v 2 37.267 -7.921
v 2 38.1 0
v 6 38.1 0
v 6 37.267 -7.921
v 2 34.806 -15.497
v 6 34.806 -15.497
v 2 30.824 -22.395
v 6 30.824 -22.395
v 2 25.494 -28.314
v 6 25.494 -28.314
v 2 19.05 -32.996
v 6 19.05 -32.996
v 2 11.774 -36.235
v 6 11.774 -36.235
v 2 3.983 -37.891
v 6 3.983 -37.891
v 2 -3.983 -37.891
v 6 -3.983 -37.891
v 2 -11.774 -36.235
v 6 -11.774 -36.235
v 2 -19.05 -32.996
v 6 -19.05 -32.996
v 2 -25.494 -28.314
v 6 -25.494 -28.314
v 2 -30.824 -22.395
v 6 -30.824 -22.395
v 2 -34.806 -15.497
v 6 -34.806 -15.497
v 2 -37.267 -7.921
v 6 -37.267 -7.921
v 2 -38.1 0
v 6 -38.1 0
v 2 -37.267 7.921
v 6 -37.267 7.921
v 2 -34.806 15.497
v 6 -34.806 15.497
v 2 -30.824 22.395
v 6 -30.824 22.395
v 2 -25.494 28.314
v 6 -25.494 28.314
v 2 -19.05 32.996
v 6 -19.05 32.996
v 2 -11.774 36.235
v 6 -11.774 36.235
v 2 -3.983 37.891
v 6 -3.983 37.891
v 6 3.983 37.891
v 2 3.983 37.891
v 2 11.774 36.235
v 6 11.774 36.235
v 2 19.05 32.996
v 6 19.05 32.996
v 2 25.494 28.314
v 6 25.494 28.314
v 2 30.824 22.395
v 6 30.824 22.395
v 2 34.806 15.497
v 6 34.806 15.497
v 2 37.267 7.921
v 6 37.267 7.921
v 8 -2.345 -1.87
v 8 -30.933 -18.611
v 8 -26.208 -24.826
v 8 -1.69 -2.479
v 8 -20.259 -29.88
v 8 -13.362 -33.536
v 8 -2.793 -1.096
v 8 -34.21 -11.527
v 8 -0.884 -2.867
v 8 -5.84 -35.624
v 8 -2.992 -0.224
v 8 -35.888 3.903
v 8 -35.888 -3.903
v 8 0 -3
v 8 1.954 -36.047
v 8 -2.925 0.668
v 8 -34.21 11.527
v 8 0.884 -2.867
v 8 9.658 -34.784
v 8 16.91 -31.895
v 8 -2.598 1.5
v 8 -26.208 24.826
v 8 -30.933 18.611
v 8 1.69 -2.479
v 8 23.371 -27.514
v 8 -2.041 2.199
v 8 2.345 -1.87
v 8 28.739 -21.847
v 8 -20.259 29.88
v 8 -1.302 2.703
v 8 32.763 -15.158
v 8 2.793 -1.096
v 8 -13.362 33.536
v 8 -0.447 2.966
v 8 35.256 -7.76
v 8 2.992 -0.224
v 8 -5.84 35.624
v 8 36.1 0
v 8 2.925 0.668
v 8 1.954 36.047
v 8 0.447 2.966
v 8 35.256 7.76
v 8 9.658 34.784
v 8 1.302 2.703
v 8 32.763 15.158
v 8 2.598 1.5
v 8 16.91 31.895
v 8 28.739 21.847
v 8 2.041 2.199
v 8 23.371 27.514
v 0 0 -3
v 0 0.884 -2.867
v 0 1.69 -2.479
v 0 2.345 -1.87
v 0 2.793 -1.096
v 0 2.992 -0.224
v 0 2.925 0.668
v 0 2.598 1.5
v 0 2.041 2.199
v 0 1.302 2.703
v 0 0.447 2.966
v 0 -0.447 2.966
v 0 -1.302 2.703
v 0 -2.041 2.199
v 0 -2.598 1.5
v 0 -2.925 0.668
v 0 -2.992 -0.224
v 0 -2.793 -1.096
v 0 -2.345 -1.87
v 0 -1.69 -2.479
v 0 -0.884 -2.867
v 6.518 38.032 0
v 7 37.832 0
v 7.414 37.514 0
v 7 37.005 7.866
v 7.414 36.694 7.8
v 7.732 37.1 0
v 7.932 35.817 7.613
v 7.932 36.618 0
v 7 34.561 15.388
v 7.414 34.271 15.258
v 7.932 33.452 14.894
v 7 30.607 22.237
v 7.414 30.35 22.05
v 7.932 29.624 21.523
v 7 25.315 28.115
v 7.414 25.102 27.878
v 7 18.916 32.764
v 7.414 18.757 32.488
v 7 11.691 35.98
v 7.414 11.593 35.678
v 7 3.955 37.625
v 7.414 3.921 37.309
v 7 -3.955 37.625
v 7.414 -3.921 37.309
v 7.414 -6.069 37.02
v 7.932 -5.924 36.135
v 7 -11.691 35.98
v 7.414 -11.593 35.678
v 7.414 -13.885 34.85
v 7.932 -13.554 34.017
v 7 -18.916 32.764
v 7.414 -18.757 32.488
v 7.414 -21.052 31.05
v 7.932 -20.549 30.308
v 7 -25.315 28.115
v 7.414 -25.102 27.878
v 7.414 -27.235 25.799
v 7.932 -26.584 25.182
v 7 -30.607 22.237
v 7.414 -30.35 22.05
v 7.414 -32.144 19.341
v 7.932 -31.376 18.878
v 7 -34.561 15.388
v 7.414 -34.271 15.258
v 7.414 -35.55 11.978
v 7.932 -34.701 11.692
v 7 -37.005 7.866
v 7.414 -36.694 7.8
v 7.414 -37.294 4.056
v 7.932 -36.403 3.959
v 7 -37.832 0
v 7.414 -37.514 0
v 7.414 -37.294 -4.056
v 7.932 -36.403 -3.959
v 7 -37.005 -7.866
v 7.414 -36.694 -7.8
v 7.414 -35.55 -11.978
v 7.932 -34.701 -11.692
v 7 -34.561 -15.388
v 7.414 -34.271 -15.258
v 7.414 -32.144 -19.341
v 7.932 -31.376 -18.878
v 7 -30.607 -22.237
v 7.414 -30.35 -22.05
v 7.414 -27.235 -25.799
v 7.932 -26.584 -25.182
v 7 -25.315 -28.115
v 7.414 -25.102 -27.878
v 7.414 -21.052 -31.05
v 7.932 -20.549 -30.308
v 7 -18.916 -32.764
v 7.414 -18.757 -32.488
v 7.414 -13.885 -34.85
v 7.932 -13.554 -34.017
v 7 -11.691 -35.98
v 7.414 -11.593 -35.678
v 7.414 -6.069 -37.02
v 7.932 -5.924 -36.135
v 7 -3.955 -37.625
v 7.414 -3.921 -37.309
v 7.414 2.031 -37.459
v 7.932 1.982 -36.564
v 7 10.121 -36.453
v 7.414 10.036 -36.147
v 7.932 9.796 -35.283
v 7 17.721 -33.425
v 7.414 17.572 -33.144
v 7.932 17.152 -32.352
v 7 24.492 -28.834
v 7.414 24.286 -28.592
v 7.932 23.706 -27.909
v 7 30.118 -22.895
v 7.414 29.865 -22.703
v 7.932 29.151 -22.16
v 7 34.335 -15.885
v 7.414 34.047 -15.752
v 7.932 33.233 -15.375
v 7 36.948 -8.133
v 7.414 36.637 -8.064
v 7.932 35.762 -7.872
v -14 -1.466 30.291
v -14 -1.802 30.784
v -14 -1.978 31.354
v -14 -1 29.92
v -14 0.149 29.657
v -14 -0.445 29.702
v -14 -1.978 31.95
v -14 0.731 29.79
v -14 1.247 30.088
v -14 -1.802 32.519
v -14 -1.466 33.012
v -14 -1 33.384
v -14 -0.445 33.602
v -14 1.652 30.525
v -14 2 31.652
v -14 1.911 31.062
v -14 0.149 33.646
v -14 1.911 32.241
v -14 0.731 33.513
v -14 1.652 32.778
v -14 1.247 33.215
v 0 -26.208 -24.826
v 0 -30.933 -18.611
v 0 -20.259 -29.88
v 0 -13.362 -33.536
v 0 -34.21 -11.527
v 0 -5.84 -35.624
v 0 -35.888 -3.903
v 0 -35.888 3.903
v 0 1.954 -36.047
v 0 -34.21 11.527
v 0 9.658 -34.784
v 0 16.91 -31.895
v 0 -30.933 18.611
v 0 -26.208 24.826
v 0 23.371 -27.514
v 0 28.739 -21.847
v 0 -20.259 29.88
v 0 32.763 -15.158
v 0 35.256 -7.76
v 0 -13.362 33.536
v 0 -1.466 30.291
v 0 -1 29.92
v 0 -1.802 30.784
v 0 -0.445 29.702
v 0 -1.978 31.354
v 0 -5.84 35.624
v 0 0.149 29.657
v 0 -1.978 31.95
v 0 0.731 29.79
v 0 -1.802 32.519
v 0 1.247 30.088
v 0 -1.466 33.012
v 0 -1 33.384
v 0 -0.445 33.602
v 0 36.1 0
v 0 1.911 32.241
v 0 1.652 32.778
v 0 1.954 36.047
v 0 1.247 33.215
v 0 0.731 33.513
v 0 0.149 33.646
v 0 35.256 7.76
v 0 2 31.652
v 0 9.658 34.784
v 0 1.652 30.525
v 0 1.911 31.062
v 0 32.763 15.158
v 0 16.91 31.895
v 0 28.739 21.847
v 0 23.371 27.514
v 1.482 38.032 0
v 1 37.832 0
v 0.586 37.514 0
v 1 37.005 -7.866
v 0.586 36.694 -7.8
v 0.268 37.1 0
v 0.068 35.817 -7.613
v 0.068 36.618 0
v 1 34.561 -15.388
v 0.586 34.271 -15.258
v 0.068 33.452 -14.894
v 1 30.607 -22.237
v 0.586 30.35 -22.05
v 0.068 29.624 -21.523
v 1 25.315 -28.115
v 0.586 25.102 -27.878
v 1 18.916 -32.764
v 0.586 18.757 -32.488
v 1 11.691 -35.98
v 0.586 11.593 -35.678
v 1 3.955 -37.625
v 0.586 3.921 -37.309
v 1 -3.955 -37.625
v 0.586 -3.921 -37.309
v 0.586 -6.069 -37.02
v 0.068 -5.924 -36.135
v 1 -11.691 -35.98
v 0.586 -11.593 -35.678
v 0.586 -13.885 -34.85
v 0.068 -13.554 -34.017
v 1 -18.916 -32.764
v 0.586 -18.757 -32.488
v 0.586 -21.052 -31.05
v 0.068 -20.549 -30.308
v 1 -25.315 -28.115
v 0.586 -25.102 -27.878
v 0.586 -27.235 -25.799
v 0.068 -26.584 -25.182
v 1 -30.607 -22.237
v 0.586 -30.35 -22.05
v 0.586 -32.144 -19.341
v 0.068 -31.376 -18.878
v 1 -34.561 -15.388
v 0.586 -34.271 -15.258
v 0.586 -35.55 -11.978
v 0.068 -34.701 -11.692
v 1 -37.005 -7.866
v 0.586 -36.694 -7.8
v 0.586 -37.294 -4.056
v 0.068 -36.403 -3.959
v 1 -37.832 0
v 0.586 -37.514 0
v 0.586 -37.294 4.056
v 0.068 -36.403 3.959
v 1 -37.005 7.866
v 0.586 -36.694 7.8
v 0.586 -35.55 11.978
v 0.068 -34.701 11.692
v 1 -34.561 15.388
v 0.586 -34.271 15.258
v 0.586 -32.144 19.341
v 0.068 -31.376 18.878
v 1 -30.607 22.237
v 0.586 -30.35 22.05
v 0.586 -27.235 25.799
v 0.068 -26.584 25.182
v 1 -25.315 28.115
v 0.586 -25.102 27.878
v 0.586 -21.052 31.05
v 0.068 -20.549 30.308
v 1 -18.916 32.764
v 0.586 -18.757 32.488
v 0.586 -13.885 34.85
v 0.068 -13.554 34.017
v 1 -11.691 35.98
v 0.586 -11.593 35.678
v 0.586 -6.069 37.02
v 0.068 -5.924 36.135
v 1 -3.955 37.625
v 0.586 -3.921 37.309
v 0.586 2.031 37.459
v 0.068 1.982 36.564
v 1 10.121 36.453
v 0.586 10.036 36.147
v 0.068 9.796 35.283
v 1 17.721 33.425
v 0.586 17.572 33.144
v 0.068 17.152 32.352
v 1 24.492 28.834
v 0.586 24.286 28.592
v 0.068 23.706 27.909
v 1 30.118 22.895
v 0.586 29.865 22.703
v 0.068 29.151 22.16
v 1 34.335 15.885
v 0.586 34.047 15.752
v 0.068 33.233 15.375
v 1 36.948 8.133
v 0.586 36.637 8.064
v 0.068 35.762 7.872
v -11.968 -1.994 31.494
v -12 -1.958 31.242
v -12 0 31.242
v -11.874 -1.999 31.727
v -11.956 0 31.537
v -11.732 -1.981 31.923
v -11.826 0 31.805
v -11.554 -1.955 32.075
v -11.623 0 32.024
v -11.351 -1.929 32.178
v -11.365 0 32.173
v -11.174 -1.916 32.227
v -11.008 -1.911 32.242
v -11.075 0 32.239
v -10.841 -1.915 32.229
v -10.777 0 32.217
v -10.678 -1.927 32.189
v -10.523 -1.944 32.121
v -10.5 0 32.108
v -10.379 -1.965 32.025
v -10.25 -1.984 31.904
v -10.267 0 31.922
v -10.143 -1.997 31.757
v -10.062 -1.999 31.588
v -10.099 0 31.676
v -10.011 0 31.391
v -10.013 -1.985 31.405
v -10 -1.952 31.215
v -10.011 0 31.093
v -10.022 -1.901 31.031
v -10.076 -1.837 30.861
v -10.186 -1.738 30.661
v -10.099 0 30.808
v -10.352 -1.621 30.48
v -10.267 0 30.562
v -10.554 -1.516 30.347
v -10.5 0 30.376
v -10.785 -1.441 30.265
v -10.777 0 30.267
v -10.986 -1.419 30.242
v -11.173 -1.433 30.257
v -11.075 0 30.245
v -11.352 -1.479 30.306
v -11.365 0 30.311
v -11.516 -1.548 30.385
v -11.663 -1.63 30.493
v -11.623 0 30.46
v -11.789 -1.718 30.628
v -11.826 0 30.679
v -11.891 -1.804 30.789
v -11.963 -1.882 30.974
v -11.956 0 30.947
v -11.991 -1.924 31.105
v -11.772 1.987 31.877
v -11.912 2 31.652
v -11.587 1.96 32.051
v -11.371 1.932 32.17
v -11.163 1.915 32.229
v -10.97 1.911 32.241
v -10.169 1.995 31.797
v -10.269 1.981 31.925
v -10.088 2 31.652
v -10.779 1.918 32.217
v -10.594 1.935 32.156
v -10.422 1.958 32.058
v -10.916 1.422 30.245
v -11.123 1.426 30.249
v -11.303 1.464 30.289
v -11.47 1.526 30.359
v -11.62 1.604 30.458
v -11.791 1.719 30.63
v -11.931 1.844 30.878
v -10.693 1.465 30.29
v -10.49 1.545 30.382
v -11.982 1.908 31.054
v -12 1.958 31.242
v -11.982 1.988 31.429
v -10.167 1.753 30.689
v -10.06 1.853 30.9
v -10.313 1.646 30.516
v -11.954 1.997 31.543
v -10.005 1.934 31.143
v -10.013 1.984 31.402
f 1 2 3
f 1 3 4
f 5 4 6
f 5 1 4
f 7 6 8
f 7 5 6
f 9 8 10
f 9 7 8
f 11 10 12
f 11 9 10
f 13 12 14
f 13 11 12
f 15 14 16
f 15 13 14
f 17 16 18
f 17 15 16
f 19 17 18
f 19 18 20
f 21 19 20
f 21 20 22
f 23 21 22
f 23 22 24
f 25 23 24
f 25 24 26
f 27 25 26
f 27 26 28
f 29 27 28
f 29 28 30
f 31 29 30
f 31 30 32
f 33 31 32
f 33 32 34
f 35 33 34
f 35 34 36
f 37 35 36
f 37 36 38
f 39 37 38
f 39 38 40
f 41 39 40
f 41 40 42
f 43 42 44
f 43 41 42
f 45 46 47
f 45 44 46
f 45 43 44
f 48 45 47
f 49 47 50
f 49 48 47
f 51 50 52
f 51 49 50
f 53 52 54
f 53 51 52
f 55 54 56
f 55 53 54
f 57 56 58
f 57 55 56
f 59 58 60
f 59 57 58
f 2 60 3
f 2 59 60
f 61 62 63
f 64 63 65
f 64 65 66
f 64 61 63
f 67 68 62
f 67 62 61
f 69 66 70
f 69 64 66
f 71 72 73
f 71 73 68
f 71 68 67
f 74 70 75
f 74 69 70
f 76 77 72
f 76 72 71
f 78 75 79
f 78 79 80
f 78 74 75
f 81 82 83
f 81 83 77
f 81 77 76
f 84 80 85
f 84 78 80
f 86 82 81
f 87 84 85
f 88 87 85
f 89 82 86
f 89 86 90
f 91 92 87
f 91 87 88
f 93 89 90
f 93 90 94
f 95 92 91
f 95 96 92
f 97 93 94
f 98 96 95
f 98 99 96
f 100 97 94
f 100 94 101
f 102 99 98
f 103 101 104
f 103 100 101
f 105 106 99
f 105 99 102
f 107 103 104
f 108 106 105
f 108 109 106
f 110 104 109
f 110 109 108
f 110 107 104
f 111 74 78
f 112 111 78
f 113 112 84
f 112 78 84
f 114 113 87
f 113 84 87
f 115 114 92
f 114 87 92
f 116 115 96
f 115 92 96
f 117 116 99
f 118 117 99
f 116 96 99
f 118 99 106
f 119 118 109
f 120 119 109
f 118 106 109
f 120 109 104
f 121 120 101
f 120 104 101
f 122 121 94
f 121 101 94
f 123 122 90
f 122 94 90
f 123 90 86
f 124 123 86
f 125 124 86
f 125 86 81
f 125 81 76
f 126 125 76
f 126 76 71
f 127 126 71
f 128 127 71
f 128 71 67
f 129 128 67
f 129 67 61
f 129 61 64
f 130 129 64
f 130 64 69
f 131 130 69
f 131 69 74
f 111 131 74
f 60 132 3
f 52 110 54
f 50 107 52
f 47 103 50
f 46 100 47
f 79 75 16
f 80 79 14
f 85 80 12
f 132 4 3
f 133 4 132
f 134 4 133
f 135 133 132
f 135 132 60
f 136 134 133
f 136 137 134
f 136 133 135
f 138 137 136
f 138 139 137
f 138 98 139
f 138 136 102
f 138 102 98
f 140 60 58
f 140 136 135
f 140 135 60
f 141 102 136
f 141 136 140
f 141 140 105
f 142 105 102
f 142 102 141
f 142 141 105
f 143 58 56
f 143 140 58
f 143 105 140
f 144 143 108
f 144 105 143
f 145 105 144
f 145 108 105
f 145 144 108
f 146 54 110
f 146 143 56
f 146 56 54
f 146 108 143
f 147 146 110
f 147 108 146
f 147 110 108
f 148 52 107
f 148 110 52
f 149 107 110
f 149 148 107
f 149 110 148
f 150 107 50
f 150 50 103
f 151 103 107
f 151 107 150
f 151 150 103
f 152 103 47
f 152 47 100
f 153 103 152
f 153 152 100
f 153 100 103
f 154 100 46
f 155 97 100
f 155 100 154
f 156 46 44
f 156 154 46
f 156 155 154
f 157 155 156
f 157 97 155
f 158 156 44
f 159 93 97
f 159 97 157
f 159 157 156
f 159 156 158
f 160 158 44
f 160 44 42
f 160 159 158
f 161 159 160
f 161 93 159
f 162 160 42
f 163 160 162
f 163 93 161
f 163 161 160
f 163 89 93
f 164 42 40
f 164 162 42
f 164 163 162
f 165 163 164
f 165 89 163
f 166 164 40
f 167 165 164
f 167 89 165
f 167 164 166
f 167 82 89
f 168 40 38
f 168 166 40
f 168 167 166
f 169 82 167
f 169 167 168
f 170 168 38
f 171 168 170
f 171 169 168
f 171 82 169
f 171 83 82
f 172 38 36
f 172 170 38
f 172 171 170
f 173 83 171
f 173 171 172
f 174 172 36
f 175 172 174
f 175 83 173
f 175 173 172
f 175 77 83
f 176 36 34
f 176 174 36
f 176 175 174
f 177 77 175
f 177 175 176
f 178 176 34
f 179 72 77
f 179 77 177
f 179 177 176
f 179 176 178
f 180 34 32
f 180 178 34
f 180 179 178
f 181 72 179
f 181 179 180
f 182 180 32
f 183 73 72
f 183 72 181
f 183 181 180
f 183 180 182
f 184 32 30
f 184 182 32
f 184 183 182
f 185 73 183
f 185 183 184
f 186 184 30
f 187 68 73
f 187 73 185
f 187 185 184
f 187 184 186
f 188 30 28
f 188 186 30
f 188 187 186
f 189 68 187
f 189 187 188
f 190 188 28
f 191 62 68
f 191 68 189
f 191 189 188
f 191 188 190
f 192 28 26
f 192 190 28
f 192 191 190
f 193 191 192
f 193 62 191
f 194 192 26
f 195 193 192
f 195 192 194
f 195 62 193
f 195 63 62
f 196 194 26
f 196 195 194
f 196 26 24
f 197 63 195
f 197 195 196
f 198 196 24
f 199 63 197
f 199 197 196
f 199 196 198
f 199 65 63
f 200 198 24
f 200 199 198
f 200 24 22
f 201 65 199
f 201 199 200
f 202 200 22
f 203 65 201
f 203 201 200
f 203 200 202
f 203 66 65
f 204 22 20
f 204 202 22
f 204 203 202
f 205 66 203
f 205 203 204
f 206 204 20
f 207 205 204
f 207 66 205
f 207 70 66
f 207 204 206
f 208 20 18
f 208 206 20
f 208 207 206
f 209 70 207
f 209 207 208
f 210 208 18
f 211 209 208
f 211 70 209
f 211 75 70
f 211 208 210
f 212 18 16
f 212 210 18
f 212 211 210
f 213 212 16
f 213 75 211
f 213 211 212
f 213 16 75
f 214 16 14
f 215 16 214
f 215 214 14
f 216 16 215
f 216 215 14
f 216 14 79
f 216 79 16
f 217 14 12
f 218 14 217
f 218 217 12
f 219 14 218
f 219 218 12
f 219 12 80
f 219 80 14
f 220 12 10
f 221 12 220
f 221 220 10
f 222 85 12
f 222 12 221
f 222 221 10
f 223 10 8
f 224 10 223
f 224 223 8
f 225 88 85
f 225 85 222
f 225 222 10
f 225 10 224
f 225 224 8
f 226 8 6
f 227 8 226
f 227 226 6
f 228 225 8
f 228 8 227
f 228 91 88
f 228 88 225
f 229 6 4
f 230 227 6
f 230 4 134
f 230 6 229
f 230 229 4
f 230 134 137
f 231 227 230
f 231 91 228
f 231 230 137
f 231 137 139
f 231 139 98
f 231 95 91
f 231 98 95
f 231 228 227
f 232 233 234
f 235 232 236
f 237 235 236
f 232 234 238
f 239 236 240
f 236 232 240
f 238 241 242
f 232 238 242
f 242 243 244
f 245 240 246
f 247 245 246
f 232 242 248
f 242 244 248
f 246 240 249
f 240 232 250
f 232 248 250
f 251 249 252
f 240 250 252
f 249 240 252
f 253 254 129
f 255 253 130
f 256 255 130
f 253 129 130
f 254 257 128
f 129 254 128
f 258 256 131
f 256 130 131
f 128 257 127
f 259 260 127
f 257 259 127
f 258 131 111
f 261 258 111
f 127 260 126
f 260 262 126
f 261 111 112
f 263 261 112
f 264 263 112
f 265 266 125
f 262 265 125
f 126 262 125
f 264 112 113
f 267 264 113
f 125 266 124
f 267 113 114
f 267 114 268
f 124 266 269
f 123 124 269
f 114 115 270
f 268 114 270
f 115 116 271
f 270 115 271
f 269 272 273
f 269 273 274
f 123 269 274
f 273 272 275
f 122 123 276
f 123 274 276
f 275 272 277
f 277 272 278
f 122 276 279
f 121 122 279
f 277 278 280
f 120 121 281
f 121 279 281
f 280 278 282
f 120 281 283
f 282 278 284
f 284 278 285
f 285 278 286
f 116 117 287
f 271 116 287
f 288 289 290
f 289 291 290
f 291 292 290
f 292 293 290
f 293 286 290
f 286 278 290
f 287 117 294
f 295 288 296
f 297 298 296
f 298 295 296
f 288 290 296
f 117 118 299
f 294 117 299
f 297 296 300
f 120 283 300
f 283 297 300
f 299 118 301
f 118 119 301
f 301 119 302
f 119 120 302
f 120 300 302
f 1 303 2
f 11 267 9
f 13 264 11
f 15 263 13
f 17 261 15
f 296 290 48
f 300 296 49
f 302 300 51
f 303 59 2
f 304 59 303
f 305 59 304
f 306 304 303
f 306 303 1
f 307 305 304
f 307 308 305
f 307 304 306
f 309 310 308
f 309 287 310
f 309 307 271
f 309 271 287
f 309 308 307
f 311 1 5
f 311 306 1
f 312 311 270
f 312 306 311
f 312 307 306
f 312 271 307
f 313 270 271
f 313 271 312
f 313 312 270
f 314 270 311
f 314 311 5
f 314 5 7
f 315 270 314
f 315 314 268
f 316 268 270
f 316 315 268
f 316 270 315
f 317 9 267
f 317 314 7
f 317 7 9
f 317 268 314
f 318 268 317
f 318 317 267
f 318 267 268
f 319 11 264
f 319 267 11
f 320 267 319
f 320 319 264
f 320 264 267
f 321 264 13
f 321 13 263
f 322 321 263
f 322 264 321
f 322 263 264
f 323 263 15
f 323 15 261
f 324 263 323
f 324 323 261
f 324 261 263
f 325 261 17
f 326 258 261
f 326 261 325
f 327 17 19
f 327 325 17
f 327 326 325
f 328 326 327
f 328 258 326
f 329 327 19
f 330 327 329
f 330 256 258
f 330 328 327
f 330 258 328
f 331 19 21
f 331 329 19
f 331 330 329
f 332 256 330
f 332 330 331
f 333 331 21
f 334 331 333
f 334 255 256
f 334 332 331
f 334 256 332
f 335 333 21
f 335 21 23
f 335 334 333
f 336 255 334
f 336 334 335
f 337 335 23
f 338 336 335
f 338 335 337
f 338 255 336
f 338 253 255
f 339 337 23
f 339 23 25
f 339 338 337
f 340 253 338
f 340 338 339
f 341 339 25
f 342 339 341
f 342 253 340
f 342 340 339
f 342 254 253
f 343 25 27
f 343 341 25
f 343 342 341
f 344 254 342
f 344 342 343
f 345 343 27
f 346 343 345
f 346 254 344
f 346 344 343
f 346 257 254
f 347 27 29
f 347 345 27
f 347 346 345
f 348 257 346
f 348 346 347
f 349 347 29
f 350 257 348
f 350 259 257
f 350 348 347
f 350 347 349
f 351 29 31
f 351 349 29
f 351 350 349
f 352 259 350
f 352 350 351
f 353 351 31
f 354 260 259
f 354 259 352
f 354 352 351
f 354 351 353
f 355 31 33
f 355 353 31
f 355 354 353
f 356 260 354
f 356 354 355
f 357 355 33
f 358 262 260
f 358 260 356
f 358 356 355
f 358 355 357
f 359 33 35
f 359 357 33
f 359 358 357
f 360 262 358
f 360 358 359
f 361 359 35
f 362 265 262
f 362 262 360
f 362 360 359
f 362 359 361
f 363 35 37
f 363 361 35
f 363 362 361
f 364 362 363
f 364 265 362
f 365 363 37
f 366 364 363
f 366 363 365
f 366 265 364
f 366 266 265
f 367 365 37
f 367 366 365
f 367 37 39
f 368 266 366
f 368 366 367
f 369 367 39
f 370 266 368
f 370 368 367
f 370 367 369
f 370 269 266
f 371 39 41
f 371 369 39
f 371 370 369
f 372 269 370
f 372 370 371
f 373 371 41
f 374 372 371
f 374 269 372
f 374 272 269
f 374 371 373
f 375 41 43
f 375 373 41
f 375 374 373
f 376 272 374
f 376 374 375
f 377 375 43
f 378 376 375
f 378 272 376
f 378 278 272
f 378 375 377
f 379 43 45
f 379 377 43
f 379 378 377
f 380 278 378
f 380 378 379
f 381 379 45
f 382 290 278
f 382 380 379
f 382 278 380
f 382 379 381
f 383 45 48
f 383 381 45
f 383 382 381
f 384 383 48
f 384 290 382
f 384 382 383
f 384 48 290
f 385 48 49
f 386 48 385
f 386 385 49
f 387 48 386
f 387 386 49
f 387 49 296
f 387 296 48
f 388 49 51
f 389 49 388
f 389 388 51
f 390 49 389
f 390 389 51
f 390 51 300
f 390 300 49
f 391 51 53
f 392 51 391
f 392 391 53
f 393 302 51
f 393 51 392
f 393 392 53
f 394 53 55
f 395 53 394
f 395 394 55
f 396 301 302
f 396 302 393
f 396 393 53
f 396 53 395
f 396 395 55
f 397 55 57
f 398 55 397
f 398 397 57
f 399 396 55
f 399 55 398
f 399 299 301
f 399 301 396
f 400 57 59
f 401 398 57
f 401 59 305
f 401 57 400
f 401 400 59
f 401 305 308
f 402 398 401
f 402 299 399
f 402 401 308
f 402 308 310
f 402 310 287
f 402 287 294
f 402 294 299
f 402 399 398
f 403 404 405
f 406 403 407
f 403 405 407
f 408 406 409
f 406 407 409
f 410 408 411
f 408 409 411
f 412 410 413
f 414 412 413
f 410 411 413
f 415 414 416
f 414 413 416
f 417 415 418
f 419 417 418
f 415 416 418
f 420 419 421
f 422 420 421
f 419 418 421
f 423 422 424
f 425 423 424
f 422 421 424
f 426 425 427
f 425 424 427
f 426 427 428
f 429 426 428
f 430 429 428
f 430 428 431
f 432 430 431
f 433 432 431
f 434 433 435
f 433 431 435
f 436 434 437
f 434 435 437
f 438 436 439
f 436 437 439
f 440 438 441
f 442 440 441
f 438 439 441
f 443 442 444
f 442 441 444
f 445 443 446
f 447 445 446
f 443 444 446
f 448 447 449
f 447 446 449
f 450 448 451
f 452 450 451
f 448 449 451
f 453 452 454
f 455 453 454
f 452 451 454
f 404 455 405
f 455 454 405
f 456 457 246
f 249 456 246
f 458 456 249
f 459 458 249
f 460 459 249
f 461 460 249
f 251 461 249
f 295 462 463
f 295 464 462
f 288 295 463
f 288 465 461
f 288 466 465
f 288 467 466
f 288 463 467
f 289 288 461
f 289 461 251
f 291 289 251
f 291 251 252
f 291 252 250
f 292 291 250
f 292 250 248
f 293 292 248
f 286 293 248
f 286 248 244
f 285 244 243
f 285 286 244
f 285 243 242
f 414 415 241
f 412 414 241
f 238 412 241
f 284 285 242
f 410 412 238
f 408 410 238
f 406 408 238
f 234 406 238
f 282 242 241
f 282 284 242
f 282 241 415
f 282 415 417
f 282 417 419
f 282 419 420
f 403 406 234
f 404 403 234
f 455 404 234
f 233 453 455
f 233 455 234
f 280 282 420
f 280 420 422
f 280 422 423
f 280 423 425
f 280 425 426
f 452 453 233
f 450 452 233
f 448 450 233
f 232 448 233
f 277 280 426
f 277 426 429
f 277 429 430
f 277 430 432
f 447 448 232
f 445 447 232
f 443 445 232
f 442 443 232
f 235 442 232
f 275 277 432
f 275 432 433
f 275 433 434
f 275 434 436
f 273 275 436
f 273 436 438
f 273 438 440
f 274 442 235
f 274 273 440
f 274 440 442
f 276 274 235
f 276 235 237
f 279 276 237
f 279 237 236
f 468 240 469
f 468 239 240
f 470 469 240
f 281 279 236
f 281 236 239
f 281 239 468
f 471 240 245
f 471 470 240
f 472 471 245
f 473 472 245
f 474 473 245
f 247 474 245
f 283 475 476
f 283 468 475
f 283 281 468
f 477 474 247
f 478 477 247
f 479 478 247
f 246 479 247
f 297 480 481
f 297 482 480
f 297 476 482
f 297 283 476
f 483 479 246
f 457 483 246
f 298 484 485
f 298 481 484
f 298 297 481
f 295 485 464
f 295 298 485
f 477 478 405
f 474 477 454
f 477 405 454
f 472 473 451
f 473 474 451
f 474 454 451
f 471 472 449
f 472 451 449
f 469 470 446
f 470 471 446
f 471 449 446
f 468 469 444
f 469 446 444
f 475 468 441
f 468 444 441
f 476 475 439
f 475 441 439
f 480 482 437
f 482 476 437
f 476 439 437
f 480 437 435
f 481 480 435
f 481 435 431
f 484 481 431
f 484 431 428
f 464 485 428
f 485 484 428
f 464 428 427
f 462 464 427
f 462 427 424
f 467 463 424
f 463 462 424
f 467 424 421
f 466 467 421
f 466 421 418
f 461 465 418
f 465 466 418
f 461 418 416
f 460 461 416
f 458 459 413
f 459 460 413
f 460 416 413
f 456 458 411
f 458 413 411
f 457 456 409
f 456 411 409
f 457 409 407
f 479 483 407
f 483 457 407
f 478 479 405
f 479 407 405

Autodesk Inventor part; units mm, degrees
ref_plane "YZ Plane" through (0, 0, 0) normal (1, 0, 0) x (0, 1, 0)
ref_plane "XZ Plane" through (0, 0, 0) normal (0, 1, 0) x (-1, 0, 0)
ref_plane "XY Plane" through (0, 0, 0) normal (0, 0, 1) x (1, 0, 0)
sketch "Sketch1" plane through (0, 0, 0) normal (1, 0, 0) x (0, 1, 0)
  circle A0 centre (0, 0) radius 38.1
  circle A1 centre (0, 31.6517) radius 2
  dimension "d0" = 76.2
  dimension "d14" = 4
extrude "Extrusion1" add sketch "Sketch1" along normal blind 8 contours A0 | A1
sketch "Sketch2" plane through (8, 0, 0) normal (1, 0, 0) x (0, 0, -1)
  circle A0 centre (0, 0) radius 3
  dimension "d3" = 6
extrude "Extrusion2" cut sketch "Sketch2" against normal through all
fillet "Fillet1" radius 2 2 edges at (8, -38.1, 0) (0, -38.1, 0)
sketch "Sketch4" plane through (8, 0, 0) normal (1, 0, 0) x (0, 0, -1)
  point P0 (0, 0)
sketch "Sketch7" plane through (8, 0, 0) normal (1, 0, 0) x (0, 0, -1)
  point P0 (0, 0)
extrude "Extrusion5" add sketch "Sketch1" against normal blind 14 contours A1
sketch "Sketch8" plane through (0, 0, 0) normal (0, 1, 0) x (-1, 0, 0)
  circle A0 centre (11, 31.2419) radius 1
  line L0 (14, 29.6517) -> (14, 33.6517) projected
  point P0 (0, 0)
  dimension "d17" = 2
  dimension "d18" = 3
extrude "Extrusion6" cut sketch "Sketch8" along normal mid plane 14
properties part number "extension circle" material "Brass, Soft Yellow"
